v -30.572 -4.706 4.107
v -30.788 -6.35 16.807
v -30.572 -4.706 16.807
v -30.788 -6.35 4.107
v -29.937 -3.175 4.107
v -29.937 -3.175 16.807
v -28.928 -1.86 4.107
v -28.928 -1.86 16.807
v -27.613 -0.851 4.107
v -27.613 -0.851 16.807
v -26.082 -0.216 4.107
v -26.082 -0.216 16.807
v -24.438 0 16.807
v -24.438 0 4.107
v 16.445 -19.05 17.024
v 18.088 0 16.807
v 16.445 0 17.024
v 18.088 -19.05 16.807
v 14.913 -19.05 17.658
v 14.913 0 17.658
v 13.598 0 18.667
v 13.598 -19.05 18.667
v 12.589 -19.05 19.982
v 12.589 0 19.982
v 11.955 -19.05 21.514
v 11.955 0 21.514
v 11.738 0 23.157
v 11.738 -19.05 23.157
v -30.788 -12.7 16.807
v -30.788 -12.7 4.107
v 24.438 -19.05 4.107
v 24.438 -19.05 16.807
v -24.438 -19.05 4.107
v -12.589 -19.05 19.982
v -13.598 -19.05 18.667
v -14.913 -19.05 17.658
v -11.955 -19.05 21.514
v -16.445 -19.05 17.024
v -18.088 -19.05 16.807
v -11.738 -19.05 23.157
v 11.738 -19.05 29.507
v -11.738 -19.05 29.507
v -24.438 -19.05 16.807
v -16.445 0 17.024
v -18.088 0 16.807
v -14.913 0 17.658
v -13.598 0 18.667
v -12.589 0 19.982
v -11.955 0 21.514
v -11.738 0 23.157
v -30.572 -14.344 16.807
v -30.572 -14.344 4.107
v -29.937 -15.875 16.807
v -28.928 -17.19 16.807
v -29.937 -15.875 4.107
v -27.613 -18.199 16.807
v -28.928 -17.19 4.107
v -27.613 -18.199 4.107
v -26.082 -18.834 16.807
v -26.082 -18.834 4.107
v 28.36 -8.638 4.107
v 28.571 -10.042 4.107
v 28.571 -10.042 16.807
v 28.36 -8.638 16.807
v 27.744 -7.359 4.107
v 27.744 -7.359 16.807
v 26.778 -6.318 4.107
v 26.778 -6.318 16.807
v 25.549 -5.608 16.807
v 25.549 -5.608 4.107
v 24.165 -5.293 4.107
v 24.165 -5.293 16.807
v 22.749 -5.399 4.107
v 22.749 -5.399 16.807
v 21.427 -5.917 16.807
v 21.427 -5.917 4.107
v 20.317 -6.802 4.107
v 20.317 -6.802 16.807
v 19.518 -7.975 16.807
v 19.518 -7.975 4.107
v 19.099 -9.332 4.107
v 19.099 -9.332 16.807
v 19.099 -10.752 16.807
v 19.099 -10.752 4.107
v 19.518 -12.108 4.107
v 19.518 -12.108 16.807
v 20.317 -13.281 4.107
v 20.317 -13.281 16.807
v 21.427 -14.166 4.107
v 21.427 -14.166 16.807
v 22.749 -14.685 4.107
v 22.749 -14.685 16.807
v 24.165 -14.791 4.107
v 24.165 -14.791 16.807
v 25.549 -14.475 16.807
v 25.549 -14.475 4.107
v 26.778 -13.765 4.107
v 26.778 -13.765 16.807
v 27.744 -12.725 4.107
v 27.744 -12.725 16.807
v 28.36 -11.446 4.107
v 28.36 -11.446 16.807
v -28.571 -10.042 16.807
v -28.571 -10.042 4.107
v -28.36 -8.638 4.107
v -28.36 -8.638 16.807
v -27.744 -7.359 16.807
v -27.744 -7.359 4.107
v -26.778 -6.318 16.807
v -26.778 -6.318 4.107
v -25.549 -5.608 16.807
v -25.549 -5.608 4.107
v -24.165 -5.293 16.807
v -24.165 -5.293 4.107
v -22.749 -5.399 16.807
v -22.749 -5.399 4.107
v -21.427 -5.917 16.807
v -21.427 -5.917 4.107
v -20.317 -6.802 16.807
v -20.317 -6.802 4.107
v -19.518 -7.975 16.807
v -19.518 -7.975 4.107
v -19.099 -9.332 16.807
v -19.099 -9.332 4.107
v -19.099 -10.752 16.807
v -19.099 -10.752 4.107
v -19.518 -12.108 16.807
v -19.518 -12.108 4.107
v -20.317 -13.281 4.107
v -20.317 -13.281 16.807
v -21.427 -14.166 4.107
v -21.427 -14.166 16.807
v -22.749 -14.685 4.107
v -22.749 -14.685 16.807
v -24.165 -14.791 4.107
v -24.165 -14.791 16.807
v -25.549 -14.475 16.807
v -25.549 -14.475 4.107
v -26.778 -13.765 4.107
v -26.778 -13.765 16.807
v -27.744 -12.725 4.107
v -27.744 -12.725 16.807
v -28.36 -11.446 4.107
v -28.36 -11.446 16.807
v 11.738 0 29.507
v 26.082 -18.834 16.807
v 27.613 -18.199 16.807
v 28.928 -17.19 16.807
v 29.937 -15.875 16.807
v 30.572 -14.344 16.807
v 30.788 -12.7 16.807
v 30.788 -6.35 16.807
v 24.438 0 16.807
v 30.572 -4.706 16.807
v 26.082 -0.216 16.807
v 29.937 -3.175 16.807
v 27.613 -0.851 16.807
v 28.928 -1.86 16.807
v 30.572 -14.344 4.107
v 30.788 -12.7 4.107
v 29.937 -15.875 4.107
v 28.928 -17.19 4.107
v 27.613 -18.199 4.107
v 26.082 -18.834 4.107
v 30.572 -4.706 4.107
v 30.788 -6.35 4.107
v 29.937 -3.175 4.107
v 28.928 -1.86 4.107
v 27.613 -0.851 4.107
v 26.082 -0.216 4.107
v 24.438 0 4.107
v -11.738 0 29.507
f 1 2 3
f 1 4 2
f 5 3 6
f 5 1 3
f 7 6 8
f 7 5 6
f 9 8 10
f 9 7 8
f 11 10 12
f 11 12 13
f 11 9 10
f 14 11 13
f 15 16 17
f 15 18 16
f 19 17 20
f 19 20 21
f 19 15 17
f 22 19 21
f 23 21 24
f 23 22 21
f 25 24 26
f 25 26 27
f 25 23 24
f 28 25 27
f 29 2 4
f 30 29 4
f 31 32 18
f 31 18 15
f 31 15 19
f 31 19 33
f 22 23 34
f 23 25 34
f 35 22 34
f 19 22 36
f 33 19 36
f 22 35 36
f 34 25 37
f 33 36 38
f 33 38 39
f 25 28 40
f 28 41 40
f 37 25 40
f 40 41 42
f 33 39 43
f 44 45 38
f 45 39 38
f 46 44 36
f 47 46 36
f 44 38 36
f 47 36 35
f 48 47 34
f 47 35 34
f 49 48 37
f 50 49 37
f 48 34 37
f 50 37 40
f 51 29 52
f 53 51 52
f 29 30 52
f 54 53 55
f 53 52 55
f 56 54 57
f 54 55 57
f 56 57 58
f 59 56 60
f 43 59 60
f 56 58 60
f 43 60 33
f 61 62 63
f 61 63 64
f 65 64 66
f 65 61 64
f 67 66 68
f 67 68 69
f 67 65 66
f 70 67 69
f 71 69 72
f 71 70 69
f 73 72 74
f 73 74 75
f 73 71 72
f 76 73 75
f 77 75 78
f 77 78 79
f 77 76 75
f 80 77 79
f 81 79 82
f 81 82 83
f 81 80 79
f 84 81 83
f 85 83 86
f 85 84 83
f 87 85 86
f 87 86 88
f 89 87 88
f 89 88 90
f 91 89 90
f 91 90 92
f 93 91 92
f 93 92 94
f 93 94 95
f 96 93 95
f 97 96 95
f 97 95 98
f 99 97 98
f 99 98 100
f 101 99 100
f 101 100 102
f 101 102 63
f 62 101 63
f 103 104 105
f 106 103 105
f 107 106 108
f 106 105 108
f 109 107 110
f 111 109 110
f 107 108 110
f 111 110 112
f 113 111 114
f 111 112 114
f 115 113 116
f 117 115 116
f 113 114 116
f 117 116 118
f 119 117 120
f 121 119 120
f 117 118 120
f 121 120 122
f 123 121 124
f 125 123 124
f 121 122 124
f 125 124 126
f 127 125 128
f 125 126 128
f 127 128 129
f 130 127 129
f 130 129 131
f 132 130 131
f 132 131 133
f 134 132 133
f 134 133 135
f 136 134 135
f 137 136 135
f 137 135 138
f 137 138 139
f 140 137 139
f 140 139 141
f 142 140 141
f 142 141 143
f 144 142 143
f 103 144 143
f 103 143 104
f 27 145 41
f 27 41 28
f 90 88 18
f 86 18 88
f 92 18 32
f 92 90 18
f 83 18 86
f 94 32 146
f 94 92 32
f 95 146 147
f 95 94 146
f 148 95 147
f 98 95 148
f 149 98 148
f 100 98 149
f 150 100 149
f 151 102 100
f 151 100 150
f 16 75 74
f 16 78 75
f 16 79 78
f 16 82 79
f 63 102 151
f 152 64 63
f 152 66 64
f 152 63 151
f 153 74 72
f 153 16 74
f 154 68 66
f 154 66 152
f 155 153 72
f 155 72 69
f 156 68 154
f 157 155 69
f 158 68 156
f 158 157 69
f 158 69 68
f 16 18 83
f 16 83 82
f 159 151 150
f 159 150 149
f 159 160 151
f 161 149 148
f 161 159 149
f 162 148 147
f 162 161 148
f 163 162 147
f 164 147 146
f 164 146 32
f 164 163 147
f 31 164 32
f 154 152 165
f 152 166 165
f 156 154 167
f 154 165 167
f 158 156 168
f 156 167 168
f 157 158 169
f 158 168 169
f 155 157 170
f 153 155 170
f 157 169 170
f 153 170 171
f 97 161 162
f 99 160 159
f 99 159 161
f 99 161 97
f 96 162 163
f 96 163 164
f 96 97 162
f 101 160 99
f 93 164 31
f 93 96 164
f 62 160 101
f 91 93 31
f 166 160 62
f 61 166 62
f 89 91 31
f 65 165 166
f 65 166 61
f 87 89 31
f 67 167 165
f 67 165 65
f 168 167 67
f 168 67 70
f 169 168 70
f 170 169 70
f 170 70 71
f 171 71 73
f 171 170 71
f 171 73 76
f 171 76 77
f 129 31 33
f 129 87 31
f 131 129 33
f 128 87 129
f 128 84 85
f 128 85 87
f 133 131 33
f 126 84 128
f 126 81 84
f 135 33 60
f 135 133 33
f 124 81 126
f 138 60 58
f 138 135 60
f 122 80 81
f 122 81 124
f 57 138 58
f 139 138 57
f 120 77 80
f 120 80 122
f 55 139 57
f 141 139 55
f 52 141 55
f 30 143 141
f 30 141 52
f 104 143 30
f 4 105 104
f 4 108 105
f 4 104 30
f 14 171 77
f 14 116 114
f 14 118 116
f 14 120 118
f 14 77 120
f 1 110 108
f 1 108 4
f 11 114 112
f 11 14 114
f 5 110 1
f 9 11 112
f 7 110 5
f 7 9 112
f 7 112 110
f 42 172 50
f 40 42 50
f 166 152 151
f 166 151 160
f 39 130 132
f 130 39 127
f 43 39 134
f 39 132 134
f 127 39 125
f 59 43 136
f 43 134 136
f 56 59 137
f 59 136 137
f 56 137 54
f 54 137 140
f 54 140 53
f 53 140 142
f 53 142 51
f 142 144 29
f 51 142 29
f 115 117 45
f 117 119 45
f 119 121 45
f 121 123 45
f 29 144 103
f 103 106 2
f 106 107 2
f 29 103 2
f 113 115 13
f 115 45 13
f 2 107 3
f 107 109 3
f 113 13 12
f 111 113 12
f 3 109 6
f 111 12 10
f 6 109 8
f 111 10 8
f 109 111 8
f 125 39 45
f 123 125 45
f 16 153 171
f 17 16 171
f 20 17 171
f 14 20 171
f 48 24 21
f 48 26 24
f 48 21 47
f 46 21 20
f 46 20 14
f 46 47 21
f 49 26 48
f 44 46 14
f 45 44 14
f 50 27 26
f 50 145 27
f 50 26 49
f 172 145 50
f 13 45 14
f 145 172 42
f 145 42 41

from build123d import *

# Parameters (mm, degrees)
F1_DEPTH = 19.05
F2_R     = 6.35
F4_D     = 9.525


with BuildPart() as f1:
    # F0 (on Front) → F1 (new body)
    with BuildSketch(Plane.XZ):
        Polygon((-11.738134, 16.807301), (-30.788134, 16.807301), (-30.788134, 4.107301), (0.961866, 4.107301), (0.961866, 29.507301), (-11.738134, 29.507301), align=None)
    extrude(amount=F1_DEPTH)

    # F2
    f2_edges = [f1.edges().sort_by_distance(p)[0] for p in [
        (-30.788134, 0, 10.457301),
        (-30.788134, -19.05, 10.457301),
        (-11.738134, -9.525, 16.807301),
    ]]
    fillet(f2_edges, radius=F2_R)

    # F4 (through all)
    with Locations(Plane.XY.offset(16.807301)):
        with Locations((-23.808645, -10.041741)):
            Hole(F4_D / 2)

    # F5: F1 across plane


with BuildPart() as f1_1:
    add(f1.part)
    add(f1.part.mirror(Plane.YZ))


solid = f1_1.part
